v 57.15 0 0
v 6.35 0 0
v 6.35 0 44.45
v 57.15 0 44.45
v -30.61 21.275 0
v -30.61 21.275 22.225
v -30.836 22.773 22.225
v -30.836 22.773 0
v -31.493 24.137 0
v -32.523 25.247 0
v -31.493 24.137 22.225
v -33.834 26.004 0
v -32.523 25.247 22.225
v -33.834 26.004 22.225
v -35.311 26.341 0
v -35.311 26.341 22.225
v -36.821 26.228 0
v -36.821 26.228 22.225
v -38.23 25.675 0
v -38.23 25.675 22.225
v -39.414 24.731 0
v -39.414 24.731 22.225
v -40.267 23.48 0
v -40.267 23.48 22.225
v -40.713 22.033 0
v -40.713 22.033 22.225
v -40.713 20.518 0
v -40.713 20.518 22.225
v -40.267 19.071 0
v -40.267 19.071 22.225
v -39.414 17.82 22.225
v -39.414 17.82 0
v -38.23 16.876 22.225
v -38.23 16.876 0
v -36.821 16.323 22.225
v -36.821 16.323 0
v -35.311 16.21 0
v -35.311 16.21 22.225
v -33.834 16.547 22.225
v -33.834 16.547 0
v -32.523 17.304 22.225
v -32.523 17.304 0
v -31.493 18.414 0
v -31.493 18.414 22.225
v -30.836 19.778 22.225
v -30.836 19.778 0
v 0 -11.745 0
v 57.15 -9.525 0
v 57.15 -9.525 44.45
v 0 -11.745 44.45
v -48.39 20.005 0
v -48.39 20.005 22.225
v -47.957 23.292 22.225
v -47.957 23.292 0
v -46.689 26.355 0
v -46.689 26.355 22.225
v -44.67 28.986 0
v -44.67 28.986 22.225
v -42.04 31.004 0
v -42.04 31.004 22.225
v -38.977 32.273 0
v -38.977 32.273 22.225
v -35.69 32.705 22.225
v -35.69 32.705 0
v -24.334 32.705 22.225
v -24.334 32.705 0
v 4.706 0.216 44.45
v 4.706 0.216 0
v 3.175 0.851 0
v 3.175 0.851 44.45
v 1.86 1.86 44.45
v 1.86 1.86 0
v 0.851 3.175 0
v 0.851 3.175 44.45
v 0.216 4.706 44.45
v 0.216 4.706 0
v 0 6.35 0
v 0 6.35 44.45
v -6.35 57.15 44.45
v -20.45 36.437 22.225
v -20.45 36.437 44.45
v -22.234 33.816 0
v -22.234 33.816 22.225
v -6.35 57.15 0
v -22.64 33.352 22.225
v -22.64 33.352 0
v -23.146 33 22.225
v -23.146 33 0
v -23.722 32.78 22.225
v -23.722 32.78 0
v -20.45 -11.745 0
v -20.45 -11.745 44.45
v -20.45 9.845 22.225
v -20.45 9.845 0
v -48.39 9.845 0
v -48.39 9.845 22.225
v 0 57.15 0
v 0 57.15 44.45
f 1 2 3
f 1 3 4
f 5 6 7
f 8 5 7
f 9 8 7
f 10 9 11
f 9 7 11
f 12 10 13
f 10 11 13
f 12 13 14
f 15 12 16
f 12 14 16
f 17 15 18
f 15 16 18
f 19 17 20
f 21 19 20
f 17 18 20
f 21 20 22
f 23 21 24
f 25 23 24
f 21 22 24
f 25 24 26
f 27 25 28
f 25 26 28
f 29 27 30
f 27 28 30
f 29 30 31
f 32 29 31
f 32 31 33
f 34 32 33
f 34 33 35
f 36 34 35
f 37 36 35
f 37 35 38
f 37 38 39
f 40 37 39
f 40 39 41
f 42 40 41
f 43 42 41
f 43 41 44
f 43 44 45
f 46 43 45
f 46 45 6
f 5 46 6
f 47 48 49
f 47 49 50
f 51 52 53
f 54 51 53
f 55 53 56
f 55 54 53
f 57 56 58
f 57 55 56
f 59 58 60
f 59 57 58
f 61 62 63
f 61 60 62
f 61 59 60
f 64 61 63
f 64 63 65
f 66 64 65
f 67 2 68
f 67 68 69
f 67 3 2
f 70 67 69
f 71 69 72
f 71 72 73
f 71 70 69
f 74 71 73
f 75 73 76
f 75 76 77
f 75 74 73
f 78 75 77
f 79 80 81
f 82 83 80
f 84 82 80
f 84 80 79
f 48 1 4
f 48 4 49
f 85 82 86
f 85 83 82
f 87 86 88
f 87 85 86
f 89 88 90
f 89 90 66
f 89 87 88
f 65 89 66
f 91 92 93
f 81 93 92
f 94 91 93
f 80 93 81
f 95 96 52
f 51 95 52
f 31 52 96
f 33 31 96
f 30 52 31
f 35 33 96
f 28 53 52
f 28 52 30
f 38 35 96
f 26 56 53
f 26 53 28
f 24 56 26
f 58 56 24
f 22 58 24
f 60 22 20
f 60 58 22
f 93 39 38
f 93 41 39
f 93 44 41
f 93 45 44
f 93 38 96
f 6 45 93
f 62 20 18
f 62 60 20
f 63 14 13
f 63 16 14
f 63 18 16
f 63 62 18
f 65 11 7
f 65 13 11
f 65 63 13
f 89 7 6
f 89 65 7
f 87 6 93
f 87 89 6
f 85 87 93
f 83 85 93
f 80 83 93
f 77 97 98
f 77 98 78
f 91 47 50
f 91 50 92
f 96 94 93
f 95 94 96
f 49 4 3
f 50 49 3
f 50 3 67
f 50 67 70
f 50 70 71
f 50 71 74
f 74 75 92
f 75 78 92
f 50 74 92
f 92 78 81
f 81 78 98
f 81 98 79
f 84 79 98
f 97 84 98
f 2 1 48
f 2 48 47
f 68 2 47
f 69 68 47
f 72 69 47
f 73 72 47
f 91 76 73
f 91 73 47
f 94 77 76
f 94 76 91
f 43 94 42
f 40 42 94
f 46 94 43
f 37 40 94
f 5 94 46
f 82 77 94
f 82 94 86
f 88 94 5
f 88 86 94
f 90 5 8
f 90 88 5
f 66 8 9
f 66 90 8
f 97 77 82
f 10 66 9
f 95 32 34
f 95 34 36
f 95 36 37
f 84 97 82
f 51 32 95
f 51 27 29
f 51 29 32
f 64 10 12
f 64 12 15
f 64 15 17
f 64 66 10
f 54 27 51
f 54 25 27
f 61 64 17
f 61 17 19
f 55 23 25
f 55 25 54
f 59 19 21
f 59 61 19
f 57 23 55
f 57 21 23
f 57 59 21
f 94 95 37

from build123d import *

# Parameters (mm, degrees)
BOSS_EXTRUDE1_DEPTH          = 44.45
FILLET2_R                    = 6.35
CUT_EXTRUDE1_START           = -22.225
CUT_EXTRUDE1_DEPTH           = 22.225
FILLET3_R                    = 2.54
F_3_8_0_375_DIAMETER_HOLE1_D = 10.16


with BuildPart() as part:
    # Sketch1 → Boss-Extrude1 (new body)
    with BuildSketch(Plane.XY):
        with BuildLine():
            Line((0, 0), (57.15, 0))
            Line((57.15, 0), (57.15, -9.525))
            Line((57.15, -9.525), (0, -11.7445024))
            Line((0, -11.7445024), (-20.4502, -11.7445024))
            Line((-20.4502, -11.7445024), (-20.4502, 9.8454976))
            Line((-20.4502, 9.8454976), (-48.3902, 9.8454976))
            Line((-48.3902, 9.8454976), (-48.3902, 20.0054976))
            ThreePointArc((-48.3902, 20.0054976), (-44.670456121, 28.985753721), (-35.6902, 32.7054976))
            Line((-35.6902, 32.7054976), (-22.9902, 32.7054976))
            Line((-22.9902, 32.7054976), (-6.35, 57.15))
            Line((-6.35, 57.15), (0, 57.15))
            Line((0, 57.15), (0, 0))
        make_face()
    extrude(amount=BOSS_EXTRUDE1_DEPTH)

    # Fillet2
    fillet2_edges = [part.edges().sort_by_distance(p)[0] for p in [
        (0, 0, 22.225),
    ]]
    fillet(fillet2_edges, radius=FILLET2_R)

    # Sketch3 → Cut-Extrude1 (cut)
    with BuildSketch(Plane.XY.offset(44.45).offset(CUT_EXTRUDE1_START)):
        with BuildLine():
            Line((-48.3902, 9.8454976), (-20.4502, 9.8454976))
            Line((-20.4502, 9.8454976), (-20.4502, 36.436765018))
            Line((-20.4502, 36.436765018), (-22.9902, 32.7054976))
            Line((-22.9902, 32.7054976), (-35.6902, 32.7054976))
            ThreePointArc((-35.6902, 32.7054976), (-44.670456121, 28.985753721), (-48.3902, 20.0054976))
            Line((-48.3902, 20.0054976), (-48.3902, 9.8454976))
        make_face()
    extrude(amount=CUT_EXTRUDE1_DEPTH, mode=Mode.SUBTRACT)

    # Fillet3
    fillet3_edges = [part.edges().sort_by_distance(p)[0] for p in [
        (-22.9902, 32.7054976, 11.1125),
    ]]
    fillet(fillet3_edges, radius=FILLET3_R)

    # 3/8 (0.375) Diameter Hole1 (through all)
    with Locations(Plane(origin=(0, 0, 0), x_dir=(-1, 0, 0), z_dir=(0, 0, -1))):
        with Locations((35.6902, 21.2754976)):
            Hole(F_3_8_0_375_DIAMETER_HOLE1_D / 2)


solid = part.part
